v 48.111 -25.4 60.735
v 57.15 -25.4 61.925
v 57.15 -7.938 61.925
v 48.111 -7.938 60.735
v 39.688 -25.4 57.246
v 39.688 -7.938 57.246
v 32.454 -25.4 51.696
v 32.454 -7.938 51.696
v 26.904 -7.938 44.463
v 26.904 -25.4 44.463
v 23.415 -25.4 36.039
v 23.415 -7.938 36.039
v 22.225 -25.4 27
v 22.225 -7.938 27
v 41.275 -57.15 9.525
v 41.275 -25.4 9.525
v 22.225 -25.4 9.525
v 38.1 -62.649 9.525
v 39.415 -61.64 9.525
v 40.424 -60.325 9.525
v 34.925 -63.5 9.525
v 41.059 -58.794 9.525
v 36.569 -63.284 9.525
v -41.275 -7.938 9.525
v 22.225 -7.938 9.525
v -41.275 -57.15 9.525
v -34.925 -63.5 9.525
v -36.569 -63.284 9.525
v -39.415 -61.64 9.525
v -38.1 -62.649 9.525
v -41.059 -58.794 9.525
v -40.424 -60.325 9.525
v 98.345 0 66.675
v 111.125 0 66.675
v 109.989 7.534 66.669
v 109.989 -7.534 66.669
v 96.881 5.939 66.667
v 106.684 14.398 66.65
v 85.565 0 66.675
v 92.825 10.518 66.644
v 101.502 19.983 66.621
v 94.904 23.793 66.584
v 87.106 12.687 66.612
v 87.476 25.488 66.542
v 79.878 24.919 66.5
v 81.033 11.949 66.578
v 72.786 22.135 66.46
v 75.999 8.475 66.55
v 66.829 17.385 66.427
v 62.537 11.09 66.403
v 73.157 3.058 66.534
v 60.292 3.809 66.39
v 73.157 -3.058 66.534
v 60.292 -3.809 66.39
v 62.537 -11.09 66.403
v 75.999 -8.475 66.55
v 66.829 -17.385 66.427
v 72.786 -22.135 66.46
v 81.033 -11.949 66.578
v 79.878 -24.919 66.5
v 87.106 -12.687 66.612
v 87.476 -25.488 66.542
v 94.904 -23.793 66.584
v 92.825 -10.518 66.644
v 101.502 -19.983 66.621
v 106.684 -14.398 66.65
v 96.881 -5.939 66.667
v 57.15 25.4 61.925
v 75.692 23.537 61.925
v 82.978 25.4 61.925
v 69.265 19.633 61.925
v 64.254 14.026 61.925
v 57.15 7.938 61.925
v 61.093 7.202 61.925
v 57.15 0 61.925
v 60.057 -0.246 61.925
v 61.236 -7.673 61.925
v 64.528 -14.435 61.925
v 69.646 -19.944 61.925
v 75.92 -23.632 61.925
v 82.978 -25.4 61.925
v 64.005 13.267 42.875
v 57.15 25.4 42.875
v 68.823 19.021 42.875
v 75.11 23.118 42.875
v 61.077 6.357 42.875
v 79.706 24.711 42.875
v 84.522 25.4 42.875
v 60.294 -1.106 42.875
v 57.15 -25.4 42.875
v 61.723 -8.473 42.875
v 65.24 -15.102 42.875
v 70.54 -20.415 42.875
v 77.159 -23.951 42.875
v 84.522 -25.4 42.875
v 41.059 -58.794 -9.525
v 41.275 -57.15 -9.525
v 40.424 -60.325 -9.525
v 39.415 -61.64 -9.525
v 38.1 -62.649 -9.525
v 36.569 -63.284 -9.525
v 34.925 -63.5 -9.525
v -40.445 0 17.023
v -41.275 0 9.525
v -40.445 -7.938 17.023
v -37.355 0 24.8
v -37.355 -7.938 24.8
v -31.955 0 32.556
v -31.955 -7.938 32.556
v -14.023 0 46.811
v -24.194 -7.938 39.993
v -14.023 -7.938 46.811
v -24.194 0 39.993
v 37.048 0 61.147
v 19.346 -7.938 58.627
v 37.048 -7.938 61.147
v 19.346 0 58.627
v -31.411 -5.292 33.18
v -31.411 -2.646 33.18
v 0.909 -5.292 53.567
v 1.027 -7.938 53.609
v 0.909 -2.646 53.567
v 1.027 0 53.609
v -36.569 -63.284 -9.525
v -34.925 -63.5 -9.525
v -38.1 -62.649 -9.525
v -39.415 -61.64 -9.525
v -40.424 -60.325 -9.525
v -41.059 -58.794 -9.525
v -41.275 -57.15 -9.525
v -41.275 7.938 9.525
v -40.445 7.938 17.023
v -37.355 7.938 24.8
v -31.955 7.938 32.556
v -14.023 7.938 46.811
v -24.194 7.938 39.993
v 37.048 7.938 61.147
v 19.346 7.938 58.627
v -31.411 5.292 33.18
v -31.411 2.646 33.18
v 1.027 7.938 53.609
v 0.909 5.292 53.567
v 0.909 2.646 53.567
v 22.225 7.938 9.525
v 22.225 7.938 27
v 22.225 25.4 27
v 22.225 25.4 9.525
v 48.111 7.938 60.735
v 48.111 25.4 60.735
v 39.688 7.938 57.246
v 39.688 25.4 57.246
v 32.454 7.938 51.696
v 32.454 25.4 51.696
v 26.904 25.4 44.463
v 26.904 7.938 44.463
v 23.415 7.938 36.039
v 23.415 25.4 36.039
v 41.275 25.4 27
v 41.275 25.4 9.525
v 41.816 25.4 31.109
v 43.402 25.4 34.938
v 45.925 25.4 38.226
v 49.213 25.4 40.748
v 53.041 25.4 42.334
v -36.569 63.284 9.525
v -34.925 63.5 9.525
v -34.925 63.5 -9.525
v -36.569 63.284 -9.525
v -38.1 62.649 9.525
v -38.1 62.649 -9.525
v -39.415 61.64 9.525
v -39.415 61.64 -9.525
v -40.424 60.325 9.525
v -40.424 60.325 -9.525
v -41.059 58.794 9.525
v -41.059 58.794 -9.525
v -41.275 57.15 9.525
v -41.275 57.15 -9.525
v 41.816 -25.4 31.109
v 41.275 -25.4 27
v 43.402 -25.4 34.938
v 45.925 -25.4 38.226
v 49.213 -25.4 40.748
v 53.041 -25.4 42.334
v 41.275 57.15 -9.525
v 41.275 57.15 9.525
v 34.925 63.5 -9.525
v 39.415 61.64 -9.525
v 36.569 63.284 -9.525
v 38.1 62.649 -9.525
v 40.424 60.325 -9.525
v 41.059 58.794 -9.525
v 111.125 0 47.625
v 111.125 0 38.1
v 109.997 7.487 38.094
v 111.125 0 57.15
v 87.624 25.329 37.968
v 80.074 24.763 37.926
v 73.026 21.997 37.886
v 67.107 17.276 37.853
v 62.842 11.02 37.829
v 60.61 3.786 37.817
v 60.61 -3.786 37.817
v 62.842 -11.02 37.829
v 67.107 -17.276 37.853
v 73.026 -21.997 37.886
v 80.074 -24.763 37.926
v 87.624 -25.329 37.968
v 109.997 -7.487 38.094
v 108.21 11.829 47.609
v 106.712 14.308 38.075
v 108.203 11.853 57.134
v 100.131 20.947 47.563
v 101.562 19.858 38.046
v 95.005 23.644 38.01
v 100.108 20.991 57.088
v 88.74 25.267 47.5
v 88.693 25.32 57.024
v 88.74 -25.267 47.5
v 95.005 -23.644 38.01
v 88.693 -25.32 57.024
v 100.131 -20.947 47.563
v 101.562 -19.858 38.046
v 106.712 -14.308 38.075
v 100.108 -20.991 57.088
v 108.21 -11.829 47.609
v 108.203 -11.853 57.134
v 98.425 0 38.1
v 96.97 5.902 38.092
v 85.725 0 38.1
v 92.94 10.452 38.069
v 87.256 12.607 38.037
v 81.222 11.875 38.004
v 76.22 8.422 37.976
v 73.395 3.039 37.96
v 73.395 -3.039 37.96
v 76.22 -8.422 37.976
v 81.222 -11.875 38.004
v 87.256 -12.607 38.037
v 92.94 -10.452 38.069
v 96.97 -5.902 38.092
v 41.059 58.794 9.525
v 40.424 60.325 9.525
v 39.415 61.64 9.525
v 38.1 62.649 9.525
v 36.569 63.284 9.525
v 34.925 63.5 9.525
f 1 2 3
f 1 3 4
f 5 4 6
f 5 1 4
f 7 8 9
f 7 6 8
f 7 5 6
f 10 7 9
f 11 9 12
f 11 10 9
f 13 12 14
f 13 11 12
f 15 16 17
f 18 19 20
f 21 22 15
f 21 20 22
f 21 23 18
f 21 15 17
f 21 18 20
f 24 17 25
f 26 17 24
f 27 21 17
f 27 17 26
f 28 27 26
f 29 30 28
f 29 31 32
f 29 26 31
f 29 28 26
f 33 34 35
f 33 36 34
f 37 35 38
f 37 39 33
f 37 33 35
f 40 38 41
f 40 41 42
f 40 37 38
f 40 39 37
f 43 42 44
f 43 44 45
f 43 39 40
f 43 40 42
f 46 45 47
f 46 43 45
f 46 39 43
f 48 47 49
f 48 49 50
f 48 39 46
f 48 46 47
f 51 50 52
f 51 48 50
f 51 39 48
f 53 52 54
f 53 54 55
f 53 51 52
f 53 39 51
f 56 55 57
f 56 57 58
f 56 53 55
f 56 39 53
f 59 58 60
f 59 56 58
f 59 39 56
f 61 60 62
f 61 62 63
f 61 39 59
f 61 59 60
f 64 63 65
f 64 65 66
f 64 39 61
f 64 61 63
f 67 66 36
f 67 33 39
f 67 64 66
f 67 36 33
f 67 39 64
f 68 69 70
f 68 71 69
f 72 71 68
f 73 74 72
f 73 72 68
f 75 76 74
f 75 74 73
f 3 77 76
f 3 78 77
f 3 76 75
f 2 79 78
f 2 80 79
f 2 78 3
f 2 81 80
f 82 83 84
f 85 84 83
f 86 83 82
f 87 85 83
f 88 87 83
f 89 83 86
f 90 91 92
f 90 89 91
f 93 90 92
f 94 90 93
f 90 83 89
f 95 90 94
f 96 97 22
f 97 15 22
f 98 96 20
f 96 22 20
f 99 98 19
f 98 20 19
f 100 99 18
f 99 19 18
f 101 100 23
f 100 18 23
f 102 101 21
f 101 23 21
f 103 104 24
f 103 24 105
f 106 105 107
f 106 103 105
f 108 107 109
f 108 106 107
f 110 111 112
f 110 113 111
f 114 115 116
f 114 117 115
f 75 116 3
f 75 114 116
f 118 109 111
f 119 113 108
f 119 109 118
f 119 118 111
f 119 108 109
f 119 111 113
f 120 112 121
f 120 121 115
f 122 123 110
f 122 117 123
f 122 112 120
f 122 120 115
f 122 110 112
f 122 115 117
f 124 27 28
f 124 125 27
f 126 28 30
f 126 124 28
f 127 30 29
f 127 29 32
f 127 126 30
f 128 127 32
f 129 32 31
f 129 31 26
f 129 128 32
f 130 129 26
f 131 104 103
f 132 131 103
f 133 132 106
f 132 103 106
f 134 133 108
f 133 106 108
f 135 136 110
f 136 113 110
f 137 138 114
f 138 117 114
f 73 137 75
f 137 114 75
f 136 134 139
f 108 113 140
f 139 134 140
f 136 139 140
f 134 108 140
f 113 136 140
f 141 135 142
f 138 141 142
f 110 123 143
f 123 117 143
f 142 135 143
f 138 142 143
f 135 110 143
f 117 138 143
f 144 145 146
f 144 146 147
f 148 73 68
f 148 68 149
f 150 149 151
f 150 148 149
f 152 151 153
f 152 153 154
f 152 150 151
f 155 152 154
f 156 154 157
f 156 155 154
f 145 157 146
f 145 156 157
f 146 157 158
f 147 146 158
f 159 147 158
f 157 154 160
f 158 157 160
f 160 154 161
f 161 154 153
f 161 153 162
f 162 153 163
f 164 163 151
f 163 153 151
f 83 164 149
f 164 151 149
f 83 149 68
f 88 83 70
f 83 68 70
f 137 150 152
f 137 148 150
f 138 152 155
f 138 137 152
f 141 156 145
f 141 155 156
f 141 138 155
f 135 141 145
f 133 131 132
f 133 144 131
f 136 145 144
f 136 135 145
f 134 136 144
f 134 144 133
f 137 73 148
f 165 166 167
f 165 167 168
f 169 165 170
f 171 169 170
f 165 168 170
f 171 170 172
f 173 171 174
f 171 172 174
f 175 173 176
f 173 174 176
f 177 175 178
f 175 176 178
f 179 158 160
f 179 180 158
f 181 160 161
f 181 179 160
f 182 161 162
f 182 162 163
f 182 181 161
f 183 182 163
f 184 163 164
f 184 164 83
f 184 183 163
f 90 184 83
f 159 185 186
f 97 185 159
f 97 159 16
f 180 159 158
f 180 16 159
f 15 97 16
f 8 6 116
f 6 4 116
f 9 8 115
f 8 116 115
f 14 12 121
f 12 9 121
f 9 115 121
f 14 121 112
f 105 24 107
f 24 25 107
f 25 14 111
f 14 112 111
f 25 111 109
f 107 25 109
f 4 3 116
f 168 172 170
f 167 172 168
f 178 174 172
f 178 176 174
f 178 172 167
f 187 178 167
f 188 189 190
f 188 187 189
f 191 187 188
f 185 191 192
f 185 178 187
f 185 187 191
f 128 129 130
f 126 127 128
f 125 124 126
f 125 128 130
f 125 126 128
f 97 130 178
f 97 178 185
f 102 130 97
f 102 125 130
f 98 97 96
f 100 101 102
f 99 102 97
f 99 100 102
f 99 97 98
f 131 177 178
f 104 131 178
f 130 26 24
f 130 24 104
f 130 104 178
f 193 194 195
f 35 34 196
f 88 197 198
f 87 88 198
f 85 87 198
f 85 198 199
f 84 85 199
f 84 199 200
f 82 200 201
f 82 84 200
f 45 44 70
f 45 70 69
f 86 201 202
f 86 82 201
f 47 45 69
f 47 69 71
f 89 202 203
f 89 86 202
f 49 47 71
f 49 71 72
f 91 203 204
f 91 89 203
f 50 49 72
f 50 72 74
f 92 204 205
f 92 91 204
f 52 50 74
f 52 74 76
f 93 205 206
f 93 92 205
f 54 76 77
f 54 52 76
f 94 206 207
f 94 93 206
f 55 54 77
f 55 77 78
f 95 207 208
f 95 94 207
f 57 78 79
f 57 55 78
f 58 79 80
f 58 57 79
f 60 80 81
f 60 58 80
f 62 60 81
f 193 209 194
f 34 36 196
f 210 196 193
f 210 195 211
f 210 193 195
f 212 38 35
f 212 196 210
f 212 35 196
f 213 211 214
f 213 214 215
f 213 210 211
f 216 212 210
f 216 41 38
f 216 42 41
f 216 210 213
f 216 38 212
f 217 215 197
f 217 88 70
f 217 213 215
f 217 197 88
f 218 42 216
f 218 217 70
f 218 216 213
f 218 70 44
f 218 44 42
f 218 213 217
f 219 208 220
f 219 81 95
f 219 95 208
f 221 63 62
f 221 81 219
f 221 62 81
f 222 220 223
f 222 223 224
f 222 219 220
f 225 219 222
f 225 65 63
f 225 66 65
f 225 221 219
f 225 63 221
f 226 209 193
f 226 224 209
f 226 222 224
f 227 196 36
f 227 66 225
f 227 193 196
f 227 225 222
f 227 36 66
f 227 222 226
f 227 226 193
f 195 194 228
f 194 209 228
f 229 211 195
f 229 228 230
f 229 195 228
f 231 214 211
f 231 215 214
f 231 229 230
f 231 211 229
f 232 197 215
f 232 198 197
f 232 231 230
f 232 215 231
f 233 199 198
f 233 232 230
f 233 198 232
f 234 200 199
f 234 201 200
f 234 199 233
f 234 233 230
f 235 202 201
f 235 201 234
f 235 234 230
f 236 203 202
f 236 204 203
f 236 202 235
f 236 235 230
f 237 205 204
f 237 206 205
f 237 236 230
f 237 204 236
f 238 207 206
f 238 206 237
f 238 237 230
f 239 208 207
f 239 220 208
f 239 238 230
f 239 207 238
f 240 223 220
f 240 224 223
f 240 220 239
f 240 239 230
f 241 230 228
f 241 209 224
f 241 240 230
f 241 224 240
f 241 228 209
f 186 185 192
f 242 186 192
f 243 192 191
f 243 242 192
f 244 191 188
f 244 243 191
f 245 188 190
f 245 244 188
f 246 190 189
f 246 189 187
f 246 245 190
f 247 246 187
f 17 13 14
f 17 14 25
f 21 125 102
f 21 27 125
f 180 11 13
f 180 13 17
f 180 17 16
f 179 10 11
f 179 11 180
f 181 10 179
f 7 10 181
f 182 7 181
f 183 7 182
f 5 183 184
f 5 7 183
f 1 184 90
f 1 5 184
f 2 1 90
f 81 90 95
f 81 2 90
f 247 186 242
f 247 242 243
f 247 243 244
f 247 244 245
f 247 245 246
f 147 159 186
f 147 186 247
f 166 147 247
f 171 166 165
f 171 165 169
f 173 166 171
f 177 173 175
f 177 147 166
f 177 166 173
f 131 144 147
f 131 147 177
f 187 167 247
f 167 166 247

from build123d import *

# Parameters (mm, degrees)
F1_DEPTH = 63.5
F0_W     = 25.2398125172
F0_H     = 19.05
F2_DEPTH = 25.4
F3_DEPTH = 7.9375
F5_R     = 6.35


with BuildPart() as f1:
    # F0 (on Front) → F1 (new body, symmetric)
    with BuildSketch(Plane.XZ):
        Polygon((-41.275, -9.525), (41.275, -9.525), (41.275, 9.525), (22.225, 9.525), (-41.275, 9.525), align=None)
    extrude(amount=F1_DEPTH, both=True)

    # F0 (on Front) → F2 (join, symmetric)
    with BuildSketch(Plane.XZ):
        with Locations((72.9449062586, 52.4002)):
            Rectangle(F0_W, F0_H)
        with BuildLine():
            Line((22.225, 9.525), (41.275, 9.525))
            Line((41.275, 9.525), (41.275, 27.0002))
            ThreePointArc((41.275, 27.0002), (45.9246798487, 38.2255201513), (57.15, 42.8752))
            Line((57.15, 42.8752), (60.325, 42.8752))
            Line((60.325, 42.8752), (60.325, 61.9252))
            Line((60.325, 61.9252), (57.15, 61.9252))
            ThreePointArc((57.15, 61.9252), (32.4542956671, 51.6959043329), (22.225, 27.0002))
            Line((22.225, 27.0002), (22.225, 9.525))
        make_face()
    extrude(amount=F2_DEPTH, both=True)

    # F0 (on Front) → F3 (join, symmetric)
    with BuildSketch(Plane.XZ):
        with BuildLine():
            add(Edge.make_bspline(
                [(-41.275, 9.525), (-42.1492531896, 31.8932123482), (-11.5411048755, 62.5013560057), (57.15, 61.9252)],
                knots=[0, 0, 0, 0, 111.5045361635, 111.5045361635, 111.5045361635, 111.5045361635], degree=3))
            Line((-41.275, 9.525), (22.225, 9.525))
            Line((22.225, 9.525), (22.225, 27.0002))
            ThreePointArc((22.225, 27.0002), (32.4542956671, 51.6959043329), (57.15, 61.9252))
        make_face()
    extrude(amount=F3_DEPTH, both=True)

    # F0 (on Front) → F4 (revolve)
    with BuildSketch(Plane.XZ):
        Polygon((111.125, 66.675), (85.5648125172, 66.675), (85.725, 38.1), (111.125, 38.1), align=None)
    revolve(axis=Axis((85.6449062586, 0, 52.3875), (-0.0056057731, 0, 0.9999842875)))

    # F5
    f5_edges = [f1.edges().sort_by_distance(p)[0] for p in [
        (41.275, 63.5, 0),
        (-41.275, 63.5, 0),
        (-41.275, -63.5, 0),
        (41.275, -63.5, 0),
    ]]
    fillet(f5_edges, radius=F5_R)


solid = f1.part
